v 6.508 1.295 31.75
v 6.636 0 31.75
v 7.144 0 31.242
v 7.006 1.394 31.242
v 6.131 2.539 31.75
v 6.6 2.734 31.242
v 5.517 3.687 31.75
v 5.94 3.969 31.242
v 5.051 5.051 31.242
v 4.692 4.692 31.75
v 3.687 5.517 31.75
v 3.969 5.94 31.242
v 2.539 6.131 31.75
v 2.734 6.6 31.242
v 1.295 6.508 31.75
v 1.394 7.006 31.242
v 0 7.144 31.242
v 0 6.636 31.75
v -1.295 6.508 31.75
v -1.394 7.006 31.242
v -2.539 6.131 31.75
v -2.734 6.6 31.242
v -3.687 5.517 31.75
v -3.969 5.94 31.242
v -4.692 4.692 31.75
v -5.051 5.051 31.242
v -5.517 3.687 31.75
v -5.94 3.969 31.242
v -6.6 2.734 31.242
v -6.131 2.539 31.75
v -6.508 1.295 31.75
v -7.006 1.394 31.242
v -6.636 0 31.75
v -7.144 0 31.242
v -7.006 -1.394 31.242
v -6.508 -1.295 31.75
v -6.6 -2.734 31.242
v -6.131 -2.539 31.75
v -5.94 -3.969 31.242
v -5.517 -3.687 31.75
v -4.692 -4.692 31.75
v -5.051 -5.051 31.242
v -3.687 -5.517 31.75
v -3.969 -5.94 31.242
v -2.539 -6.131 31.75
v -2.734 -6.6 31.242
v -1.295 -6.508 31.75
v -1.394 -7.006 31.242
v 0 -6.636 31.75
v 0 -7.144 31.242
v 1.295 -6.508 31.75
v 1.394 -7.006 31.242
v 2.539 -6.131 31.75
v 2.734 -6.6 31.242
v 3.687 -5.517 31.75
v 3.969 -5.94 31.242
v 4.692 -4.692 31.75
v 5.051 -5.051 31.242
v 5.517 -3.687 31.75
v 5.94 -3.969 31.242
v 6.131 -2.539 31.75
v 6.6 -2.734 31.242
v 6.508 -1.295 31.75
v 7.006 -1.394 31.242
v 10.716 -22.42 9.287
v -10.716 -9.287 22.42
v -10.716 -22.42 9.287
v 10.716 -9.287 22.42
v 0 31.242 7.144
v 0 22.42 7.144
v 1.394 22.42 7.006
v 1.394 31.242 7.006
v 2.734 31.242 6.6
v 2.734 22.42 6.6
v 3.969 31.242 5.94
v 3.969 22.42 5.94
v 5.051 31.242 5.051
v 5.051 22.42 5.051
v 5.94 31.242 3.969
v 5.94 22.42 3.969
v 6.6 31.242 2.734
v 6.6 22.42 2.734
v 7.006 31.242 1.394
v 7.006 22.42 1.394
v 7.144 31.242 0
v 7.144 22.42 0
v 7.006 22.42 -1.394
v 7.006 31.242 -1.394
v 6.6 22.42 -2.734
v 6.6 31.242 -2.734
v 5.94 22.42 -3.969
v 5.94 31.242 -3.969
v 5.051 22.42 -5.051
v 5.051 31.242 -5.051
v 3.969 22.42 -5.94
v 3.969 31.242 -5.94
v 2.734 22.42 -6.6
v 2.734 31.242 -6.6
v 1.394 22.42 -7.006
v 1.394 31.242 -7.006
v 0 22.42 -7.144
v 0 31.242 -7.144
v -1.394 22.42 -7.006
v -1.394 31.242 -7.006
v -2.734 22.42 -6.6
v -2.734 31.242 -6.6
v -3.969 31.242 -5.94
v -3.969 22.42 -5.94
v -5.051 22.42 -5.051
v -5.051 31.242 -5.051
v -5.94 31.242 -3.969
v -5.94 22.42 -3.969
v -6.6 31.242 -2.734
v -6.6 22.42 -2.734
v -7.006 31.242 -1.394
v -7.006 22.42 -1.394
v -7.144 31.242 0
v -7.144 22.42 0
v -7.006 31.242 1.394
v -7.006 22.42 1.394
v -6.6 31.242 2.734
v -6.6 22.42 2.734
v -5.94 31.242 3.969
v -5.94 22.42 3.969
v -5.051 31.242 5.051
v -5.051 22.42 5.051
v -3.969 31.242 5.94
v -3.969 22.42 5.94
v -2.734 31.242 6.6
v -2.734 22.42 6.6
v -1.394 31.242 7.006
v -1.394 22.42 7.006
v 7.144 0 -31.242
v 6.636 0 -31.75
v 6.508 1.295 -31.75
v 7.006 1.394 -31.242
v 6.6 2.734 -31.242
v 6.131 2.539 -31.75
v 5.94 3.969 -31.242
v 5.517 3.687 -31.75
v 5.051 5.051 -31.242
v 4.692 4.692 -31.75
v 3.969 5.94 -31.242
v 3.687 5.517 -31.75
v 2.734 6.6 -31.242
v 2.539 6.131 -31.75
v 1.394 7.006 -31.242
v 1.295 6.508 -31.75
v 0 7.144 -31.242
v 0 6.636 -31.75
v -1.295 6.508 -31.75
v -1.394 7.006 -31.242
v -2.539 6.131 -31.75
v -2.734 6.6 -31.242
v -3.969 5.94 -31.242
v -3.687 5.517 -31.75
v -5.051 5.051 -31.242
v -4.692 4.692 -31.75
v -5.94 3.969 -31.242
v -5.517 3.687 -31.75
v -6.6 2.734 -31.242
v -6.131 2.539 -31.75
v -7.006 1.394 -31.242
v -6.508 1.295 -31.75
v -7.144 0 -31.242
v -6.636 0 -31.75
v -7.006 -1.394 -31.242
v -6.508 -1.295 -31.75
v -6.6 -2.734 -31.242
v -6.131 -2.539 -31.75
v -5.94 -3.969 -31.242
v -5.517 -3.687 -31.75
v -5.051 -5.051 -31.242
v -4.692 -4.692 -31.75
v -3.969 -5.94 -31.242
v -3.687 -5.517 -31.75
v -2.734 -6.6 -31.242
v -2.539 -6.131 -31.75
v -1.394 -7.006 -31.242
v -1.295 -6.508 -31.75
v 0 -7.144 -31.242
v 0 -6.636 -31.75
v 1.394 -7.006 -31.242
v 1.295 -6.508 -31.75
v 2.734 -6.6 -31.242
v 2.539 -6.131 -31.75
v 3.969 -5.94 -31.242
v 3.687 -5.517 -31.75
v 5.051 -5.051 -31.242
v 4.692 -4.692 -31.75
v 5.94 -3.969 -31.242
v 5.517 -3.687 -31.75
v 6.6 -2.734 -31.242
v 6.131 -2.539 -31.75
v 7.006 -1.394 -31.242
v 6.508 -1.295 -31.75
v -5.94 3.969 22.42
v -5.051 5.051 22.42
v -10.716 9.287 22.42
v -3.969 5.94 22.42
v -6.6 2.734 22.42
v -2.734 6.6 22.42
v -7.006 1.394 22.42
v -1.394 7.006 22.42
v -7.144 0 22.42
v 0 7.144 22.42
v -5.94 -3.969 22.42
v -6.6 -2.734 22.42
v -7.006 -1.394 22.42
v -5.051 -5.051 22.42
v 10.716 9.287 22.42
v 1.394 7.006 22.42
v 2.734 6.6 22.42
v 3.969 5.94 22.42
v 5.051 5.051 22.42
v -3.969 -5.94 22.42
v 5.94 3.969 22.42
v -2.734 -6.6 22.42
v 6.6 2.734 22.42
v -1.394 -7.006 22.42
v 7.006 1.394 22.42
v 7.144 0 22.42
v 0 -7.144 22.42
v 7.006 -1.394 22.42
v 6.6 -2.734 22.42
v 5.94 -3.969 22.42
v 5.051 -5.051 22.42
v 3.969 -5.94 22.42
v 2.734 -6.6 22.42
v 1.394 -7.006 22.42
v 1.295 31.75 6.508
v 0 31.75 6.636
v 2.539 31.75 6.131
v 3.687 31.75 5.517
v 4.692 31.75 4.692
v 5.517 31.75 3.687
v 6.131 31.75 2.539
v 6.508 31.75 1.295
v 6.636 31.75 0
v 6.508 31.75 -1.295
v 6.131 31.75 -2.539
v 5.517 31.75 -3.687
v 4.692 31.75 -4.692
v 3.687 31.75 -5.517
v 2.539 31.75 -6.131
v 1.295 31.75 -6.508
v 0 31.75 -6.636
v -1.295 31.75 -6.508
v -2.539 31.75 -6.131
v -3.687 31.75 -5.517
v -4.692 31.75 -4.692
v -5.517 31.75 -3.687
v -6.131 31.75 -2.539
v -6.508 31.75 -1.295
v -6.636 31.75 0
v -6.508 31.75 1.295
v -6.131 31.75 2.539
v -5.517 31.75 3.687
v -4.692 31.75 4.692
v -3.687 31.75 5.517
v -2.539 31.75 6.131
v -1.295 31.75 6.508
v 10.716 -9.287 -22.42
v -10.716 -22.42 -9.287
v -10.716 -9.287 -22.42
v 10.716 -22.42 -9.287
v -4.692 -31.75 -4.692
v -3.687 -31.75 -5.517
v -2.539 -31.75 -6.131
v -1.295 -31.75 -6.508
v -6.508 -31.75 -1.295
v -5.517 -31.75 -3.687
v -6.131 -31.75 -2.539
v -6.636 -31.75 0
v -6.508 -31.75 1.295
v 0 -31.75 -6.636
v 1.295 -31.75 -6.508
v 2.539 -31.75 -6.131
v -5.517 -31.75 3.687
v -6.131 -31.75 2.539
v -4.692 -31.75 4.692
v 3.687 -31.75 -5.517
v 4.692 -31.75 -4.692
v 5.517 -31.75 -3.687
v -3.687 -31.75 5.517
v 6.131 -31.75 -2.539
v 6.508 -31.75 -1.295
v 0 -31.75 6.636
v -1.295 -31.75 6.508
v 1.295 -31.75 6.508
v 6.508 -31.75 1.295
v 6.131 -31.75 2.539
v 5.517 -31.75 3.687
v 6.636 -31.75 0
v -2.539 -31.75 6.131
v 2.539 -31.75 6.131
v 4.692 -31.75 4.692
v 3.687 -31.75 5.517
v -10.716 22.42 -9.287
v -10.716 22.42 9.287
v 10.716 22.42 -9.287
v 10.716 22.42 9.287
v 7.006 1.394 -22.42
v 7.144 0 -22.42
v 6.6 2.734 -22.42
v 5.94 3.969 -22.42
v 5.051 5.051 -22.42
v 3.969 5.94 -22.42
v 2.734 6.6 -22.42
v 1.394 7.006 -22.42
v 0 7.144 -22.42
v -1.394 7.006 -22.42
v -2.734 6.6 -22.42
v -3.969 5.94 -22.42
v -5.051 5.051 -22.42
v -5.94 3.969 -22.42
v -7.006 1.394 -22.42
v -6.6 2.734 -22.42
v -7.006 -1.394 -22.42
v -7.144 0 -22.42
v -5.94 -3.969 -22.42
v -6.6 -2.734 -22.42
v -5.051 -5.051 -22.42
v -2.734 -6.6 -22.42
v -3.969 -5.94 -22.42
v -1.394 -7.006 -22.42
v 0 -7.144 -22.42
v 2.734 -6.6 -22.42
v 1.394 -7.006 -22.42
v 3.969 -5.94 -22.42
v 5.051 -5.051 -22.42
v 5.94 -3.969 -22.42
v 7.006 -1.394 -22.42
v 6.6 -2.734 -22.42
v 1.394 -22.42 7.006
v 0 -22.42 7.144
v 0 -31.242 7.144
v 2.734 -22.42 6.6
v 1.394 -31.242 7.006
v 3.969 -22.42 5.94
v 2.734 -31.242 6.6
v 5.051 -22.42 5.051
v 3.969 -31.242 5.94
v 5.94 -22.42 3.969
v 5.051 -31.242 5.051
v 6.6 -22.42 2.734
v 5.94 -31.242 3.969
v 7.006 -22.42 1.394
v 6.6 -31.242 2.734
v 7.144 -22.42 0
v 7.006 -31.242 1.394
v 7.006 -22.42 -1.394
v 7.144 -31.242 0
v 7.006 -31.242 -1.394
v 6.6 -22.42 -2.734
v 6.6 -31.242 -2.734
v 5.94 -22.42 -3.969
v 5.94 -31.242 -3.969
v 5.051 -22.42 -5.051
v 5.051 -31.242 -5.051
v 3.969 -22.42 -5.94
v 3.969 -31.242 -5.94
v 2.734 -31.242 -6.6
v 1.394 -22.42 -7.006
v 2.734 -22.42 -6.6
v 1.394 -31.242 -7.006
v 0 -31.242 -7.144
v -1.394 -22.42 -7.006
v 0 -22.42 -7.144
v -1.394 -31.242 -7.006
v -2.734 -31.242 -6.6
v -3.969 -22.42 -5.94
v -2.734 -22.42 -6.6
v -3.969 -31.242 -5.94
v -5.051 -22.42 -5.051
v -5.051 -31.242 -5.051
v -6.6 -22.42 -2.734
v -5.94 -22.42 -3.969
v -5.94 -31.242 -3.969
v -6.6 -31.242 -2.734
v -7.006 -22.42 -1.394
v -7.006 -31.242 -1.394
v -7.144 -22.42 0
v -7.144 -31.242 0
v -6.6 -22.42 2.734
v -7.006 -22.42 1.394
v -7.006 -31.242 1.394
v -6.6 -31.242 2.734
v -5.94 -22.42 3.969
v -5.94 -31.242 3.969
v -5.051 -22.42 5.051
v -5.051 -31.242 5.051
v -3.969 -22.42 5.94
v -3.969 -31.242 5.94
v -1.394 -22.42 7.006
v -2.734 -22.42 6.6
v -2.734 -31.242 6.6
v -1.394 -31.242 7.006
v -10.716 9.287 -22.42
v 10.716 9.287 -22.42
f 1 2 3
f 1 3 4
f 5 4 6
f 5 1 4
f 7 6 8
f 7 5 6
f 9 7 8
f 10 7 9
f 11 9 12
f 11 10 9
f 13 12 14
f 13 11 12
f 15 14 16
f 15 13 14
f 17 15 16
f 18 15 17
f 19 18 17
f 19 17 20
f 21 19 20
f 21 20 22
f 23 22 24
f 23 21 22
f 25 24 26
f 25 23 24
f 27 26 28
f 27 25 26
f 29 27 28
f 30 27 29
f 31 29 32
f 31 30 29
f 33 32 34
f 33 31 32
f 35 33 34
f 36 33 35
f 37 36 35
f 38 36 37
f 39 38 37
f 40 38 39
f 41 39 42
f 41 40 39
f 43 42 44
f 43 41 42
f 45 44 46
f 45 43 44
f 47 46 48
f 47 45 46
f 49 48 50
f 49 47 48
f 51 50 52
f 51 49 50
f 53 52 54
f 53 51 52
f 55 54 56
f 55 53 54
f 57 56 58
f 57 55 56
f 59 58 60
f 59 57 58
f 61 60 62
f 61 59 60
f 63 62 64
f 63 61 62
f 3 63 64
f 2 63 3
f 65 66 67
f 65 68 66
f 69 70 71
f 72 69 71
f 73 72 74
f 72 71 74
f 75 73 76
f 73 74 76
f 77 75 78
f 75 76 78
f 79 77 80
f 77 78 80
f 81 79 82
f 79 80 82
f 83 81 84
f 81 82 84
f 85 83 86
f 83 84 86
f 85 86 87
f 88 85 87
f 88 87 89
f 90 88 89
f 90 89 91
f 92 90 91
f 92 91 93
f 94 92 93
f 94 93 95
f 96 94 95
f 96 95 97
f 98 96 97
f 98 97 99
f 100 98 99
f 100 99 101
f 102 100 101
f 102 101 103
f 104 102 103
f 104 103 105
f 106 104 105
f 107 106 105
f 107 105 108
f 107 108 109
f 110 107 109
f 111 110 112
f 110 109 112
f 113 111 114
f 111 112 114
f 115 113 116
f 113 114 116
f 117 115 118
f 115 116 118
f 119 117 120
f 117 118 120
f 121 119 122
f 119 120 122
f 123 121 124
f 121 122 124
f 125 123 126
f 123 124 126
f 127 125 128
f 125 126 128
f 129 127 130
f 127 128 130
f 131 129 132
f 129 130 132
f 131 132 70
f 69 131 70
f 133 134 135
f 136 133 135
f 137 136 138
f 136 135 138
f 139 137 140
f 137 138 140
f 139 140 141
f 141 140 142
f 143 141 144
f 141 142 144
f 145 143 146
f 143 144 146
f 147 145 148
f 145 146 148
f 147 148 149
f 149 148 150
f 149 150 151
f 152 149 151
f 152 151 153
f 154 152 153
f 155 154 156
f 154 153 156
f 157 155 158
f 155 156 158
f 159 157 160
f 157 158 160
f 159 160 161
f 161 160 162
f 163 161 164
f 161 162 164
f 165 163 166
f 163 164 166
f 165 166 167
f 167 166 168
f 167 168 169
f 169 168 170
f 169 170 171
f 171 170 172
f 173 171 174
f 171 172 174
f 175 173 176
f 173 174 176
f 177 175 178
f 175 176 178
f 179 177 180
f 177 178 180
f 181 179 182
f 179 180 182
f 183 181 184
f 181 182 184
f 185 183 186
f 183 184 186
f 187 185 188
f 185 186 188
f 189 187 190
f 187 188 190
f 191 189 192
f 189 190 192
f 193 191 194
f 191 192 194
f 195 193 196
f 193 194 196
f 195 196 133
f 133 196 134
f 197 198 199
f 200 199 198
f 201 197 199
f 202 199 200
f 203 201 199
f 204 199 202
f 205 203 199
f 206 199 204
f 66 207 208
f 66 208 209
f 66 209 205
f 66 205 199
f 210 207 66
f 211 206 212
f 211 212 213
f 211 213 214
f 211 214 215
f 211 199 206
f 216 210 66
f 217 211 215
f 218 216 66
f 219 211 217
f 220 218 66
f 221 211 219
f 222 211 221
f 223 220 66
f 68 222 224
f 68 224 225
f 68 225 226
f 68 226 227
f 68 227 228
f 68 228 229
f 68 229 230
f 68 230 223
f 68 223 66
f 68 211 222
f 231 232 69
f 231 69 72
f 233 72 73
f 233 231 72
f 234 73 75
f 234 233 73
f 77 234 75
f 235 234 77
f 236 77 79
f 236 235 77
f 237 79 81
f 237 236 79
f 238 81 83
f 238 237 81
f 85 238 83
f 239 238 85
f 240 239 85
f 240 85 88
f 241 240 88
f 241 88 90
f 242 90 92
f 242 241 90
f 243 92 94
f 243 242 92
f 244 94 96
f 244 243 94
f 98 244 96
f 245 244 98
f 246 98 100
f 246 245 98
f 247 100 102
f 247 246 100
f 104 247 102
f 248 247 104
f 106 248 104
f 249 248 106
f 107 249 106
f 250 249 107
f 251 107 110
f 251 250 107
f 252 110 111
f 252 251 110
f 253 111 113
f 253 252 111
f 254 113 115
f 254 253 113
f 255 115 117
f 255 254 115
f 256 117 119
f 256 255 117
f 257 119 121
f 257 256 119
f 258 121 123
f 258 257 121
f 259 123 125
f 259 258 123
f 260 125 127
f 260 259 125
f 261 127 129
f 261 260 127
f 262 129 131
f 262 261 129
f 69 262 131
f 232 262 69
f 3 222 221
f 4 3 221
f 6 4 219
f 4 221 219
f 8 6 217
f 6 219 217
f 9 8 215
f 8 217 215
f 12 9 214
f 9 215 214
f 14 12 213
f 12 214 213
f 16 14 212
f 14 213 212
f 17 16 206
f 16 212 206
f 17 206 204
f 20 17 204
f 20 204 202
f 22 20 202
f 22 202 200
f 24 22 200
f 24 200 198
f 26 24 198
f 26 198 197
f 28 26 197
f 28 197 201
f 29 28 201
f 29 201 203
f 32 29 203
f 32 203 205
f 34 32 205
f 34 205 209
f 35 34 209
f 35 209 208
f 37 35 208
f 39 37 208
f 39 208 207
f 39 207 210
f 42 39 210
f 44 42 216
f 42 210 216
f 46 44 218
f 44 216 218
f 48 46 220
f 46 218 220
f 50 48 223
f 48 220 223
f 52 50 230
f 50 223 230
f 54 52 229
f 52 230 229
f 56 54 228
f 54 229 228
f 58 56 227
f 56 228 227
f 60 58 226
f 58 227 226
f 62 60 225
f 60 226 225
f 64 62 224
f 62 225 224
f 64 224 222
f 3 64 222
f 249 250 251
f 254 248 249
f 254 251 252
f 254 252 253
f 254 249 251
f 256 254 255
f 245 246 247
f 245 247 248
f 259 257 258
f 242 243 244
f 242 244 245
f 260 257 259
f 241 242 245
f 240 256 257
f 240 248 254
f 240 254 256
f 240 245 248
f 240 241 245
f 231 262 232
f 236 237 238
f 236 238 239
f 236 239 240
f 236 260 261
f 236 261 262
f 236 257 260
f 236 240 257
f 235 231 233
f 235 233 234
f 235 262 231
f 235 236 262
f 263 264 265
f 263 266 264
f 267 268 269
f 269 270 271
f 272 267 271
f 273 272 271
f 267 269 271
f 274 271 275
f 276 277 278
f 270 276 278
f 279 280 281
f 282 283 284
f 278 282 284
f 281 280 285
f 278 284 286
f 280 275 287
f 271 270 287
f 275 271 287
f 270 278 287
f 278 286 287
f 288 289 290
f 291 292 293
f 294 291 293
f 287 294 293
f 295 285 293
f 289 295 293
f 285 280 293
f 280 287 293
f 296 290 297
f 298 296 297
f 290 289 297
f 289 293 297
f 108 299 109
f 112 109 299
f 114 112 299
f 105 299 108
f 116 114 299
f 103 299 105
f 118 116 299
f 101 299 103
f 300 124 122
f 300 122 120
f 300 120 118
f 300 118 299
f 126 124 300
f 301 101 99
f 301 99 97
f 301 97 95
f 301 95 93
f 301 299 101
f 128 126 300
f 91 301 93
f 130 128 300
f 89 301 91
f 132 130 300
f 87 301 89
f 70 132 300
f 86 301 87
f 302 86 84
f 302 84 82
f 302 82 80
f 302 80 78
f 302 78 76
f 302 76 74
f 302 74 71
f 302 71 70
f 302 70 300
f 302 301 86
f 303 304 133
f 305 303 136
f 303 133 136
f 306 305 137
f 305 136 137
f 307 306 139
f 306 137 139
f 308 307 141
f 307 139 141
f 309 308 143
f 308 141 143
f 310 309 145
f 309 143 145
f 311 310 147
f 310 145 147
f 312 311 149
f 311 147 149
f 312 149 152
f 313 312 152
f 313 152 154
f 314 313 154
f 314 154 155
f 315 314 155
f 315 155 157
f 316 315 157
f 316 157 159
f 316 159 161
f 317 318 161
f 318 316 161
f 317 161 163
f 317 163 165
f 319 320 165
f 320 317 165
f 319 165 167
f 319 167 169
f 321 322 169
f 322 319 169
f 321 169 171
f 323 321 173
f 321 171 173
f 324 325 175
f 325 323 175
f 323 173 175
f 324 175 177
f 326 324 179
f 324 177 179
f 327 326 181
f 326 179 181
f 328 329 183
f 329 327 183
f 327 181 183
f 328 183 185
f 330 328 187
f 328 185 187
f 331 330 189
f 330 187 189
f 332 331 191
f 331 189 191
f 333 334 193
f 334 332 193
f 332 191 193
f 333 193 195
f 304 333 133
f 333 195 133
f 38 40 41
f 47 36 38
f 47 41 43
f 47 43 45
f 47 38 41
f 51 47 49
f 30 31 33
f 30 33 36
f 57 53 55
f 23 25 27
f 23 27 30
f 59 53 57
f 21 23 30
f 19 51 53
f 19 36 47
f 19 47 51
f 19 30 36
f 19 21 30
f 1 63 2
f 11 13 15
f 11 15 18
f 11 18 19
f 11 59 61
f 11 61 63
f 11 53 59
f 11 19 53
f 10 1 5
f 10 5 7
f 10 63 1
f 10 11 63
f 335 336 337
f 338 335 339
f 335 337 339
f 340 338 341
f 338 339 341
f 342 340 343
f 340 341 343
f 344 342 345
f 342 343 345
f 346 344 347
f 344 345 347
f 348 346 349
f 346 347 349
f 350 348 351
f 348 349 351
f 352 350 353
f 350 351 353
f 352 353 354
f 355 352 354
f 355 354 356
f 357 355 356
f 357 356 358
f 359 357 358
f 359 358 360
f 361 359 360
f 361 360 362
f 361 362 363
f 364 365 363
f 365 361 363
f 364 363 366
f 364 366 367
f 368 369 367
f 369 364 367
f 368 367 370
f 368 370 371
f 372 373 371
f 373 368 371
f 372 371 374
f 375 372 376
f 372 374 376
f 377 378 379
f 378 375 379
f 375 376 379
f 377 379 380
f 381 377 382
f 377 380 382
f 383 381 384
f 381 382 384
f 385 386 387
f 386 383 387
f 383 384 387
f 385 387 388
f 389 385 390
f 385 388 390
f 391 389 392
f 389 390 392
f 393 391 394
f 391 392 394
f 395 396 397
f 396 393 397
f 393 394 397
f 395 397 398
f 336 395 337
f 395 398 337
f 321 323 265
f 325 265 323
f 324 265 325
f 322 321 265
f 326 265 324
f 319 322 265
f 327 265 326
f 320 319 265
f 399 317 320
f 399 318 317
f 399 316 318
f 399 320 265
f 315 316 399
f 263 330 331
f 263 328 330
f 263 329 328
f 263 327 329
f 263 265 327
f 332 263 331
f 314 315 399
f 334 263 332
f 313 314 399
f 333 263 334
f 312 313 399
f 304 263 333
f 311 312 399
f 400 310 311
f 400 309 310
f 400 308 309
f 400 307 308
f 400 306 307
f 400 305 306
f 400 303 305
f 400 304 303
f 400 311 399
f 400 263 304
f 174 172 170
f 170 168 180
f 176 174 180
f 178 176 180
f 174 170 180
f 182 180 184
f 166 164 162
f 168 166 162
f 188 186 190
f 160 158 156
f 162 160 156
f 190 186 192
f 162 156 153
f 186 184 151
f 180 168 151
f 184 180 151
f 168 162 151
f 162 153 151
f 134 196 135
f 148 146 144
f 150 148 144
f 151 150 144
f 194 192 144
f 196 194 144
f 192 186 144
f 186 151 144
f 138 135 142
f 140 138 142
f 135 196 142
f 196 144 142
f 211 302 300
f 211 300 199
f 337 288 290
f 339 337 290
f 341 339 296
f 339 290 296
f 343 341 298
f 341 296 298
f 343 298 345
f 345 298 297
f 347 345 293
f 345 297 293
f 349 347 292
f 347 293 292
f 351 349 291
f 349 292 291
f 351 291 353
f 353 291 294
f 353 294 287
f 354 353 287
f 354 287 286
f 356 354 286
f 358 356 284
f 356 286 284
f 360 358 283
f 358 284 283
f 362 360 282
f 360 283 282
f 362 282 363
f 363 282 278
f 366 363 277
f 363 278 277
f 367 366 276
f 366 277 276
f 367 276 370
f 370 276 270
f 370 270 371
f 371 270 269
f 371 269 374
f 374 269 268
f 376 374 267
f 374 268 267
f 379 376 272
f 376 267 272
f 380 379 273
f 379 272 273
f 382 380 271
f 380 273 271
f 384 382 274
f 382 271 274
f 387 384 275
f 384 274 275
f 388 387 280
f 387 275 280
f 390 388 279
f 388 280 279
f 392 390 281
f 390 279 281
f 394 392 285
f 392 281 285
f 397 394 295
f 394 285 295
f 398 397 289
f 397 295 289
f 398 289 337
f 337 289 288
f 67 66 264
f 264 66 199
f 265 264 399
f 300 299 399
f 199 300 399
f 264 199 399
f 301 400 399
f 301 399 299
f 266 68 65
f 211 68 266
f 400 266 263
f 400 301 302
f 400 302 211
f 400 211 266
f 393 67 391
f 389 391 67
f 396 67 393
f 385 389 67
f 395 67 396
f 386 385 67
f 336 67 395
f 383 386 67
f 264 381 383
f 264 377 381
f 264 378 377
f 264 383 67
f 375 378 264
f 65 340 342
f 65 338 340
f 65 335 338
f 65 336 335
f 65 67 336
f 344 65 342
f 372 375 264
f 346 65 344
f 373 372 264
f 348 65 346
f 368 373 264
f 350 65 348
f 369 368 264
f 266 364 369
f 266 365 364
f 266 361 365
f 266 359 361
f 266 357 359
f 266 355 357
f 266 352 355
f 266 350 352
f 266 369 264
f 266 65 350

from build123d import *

# Parameters (mm, degrees)
EXTRUDE10_DEPTH          = 31.75
EXTRUDE10_DEPTH_BACK     = 31.75
SKETCH10_R               = 7.14375
BOSS_EXTRUDE7_DEPTH      = 31.75
BOSS_EXTRUDE7_DEPTH_BACK = 31.75
SKETCH31_R               = 7.14375
BOSS_EXTRUDE8_DEPTH      = 10.715625
CHAMFER2_SIZE            = 0.508


with BuildPart() as part:
    # Sketch10 → Extrude10 (new, two sides: drawn at the far end of the back side and taken through both)
    with BuildSketch(Plane.XY.offset(-EXTRUDE10_DEPTH_BACK)):
        Circle(SKETCH10_R)
    extrude(amount=EXTRUDE10_DEPTH + EXTRUDE10_DEPTH_BACK)



with BuildPart() as body_2:
    # Sketch31 → Boss-Extrude7 (new, two sides: drawn at the far end of the back side and taken through both)
    with BuildSketch(Plane(origin=(0, 0, 0), x_dir=(1, 0, 0), z_dir=(0, 1, 0)).offset(-BOSS_EXTRUDE7_DEPTH_BACK)):
        Circle(SKETCH31_R)
    extrude(amount=BOSS_EXTRUDE7_DEPTH + BOSS_EXTRUDE7_DEPTH_BACK)


with BuildPart() as part_1:
    add(part.part)

    add(body_2.part)  # Boss-Extrude8 merges body 2
    # Sketch32 → Boss-Extrude8 (add, symmetric)
    with BuildSketch(Plane(origin=(0, 0, 0), x_dir=(0, 0, -1), z_dir=(1, 0, 0))):
        Polygon((9.286875, -22.420499577), (22.420499577, -9.286875), (22.420499577, 9.286875), (9.286875, 22.420499577), (-9.286875, 22.420499577), (-22.420499577, 9.286875), (-22.420499577, -9.286875), (-9.286875, -22.420499577), align=None)
    extrude(amount=BOSS_EXTRUDE8_DEPTH, both=True)

    # Chamfer2
    chamfer2_edges = [part_1.edges().sort_by_distance(p)[0] for p in [
        (-7.14375, -31.75, 0),
        (-7.14375, 0, -31.75),
        (-7.14375, 31.75, 0),
        (-7.14375, 0, 31.75),
    ]]
    chamfer(chamfer2_edges, length=CHAMFER2_SIZE)


solid = part_1.part
